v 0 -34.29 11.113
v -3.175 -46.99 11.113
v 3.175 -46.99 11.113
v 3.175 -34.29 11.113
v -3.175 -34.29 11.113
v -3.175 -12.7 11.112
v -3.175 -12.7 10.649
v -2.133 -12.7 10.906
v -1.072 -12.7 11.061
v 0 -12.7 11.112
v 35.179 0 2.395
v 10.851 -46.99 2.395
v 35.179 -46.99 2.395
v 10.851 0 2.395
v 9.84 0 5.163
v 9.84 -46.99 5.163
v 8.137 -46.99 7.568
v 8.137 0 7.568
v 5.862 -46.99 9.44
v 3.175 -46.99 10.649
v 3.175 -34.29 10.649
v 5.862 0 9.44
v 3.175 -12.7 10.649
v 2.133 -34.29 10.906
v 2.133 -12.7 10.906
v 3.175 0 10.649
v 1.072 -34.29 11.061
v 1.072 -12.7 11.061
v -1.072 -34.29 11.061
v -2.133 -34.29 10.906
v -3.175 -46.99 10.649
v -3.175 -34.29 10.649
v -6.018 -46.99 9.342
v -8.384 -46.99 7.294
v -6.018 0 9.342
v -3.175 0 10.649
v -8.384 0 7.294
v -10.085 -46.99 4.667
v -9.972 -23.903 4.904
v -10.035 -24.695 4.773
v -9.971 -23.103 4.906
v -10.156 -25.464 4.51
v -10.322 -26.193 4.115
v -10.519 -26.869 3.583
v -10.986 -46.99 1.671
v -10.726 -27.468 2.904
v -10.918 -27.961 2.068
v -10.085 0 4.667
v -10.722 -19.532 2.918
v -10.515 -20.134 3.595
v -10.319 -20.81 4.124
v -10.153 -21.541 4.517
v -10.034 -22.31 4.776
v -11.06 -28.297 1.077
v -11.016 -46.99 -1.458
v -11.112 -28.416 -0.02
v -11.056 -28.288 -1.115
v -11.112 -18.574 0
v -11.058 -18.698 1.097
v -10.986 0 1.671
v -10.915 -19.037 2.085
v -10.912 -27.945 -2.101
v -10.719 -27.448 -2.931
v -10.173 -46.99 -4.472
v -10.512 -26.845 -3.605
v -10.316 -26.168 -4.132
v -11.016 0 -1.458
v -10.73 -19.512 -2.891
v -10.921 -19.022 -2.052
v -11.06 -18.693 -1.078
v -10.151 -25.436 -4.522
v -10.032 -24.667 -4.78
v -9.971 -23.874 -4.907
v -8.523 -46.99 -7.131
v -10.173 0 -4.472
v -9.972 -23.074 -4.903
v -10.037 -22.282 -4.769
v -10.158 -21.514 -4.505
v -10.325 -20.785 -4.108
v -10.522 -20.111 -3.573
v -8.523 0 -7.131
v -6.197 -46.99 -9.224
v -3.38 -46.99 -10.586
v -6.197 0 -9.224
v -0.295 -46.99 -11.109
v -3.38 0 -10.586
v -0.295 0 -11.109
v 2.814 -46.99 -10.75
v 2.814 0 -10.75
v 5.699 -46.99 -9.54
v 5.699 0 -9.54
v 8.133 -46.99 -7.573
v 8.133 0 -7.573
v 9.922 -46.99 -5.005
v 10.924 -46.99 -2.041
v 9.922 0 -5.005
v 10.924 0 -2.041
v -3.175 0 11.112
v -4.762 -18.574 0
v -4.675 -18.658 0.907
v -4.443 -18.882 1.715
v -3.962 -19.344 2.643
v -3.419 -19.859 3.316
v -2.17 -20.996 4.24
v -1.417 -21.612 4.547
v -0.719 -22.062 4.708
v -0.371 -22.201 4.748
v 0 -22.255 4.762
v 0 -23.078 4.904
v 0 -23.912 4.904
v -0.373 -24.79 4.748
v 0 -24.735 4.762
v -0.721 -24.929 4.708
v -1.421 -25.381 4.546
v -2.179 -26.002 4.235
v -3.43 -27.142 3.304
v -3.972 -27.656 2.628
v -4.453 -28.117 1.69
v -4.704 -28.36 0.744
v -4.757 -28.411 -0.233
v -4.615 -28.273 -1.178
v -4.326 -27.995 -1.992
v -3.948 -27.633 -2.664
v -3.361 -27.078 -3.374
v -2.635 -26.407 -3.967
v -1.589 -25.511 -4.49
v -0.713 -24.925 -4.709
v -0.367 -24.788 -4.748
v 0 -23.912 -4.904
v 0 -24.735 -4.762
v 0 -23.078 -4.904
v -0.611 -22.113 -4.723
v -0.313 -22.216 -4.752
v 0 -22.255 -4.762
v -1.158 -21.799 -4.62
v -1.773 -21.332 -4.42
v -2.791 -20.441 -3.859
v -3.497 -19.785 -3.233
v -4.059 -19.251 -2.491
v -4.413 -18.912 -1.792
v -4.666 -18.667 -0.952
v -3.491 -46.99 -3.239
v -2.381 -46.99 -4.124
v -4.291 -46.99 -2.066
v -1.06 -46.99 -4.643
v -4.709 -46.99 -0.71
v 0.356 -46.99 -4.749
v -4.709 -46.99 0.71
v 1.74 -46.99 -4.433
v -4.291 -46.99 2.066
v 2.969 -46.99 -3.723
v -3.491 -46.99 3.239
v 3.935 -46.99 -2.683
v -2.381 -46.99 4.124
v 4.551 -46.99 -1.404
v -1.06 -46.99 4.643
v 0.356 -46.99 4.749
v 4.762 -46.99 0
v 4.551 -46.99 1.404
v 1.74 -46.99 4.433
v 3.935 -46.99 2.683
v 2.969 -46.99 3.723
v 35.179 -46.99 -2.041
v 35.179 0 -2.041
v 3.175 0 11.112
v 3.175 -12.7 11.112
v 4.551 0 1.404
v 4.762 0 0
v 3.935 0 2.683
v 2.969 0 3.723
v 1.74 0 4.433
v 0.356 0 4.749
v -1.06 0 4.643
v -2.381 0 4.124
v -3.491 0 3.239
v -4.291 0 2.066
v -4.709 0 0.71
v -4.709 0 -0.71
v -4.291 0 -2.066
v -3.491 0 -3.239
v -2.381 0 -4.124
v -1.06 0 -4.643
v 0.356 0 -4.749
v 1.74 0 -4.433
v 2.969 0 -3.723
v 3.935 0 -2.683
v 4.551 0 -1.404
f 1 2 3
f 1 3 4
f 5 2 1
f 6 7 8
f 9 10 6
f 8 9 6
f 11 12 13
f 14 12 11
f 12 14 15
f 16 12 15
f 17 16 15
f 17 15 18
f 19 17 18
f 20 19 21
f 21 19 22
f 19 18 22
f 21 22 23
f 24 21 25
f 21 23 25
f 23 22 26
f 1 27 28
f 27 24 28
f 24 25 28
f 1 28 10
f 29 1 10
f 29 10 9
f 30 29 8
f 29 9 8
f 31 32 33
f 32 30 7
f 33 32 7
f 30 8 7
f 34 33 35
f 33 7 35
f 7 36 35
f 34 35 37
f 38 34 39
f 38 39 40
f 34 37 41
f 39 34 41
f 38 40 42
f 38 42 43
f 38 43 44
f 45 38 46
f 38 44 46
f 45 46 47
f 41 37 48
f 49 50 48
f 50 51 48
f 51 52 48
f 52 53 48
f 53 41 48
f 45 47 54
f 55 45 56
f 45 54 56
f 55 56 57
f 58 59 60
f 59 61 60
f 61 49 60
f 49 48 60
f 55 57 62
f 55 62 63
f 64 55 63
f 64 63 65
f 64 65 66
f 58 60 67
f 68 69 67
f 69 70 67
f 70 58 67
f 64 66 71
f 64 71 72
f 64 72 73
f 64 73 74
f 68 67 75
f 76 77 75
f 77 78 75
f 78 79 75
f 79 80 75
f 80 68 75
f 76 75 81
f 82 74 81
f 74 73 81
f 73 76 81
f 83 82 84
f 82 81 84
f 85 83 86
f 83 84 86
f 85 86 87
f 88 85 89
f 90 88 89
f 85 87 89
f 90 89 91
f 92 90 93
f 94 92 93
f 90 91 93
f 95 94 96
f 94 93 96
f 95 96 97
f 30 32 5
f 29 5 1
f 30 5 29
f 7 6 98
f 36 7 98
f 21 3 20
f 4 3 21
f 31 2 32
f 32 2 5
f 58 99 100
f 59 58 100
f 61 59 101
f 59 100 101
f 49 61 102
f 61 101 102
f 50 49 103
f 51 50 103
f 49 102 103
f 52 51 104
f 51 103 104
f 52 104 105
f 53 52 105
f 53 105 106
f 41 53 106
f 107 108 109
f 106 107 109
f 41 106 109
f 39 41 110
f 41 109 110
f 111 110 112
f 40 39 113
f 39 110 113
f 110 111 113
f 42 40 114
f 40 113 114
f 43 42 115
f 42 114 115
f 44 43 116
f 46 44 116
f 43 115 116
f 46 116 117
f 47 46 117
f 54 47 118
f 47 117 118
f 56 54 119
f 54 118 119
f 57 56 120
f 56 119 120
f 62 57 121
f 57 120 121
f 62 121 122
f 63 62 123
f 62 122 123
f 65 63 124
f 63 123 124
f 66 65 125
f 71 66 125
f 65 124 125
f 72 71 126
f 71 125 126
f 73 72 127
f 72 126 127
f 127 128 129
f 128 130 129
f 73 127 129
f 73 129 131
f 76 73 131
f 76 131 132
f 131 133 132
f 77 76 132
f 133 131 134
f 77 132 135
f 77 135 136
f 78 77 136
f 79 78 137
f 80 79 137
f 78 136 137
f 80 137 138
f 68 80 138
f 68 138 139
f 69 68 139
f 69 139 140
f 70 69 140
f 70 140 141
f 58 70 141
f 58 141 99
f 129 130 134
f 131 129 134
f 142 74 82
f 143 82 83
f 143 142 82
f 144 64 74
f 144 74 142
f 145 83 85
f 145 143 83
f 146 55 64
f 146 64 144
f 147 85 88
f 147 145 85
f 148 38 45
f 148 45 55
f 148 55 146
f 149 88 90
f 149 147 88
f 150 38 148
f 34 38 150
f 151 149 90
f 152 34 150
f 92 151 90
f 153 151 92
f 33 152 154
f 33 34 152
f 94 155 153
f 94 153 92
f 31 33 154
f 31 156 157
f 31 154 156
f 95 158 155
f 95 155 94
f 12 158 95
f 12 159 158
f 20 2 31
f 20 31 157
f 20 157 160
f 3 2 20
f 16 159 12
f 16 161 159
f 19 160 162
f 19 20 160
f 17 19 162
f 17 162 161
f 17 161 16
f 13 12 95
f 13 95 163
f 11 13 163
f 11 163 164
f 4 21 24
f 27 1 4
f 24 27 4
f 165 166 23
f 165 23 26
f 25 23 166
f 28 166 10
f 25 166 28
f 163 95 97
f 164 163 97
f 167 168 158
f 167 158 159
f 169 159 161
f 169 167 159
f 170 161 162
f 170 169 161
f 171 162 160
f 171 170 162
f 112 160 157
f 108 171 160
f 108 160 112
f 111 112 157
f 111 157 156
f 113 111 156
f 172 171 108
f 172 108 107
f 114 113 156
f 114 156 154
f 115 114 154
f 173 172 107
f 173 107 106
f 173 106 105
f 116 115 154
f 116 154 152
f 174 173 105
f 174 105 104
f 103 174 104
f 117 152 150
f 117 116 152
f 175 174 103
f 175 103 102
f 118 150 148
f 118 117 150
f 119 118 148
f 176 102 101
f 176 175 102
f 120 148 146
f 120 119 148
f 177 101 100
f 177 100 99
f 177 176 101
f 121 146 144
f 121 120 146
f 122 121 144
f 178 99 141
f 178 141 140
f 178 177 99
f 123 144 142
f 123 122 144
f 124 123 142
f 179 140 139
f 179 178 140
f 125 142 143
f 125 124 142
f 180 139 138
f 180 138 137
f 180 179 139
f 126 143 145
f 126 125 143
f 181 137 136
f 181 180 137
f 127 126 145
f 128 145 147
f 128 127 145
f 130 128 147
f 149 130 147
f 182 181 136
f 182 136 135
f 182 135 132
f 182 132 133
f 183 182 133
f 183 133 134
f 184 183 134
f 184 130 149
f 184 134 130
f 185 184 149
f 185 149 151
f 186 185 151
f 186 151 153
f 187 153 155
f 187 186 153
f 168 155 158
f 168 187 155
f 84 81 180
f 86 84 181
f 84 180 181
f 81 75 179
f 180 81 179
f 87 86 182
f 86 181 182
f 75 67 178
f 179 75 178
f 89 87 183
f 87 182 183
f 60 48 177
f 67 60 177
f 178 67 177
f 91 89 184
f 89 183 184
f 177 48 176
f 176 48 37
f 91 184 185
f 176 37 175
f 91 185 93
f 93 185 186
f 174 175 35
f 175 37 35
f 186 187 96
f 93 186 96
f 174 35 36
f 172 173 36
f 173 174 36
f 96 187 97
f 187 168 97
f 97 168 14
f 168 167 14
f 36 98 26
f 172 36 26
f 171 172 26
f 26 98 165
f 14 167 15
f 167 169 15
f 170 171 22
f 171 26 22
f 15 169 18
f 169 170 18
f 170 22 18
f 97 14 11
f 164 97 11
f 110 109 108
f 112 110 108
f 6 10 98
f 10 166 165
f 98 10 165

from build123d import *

# Parameters (mm, degrees)
F0_R     = 11.1125
F0_R_2   = 4.7625
F1_DEPTH = 46.99
F2_W     = 12.7
F2_H     = 3.7792036489
F2_H_2   = 3.4237923279
F3_DEPTH = 3.175
F5_W     = 46.99
F5_H     = 4.4356931467
F6_DEPTH = 25.4
F7_R     = 4.92125
F8_DEPTH = 25.4


# Not quite as in the source:
# - a feature names something its author has since deleted; it is built from what else it names


with BuildPart() as f1:
    # F0 (on Front) → F1 (new body)
    with BuildSketch(Plane.XZ):
        Circle(F0_R)
        Circle(F0_R_2, mode=Mode.SUBTRACT)
    extrude(amount=F1_DEPTH)

    # F2 (on Right) → F3 (join, symmetric)
    with BuildSketch(Plane.YZ):
        with Locations((-40.64, 9.2228981756)):
            Rectangle(F2_W, F2_H)
        with Locations((-6.35, 9.400603836)):
            Rectangle(F2_W, F2_H_2)
    extrude(amount=F3_DEPTH, both=True)

    # F5 (on offset) → F6 (join)
    with BuildSketch(Plane.YZ.offset(9.779)):
        with Locations((-23.495, 0.1773260301)):
            Rectangle(F5_W, F5_H)
    extrude(amount=F6_DEPTH)

    # F7 (on Right) → F8 (cut)
    with BuildSketch(Plane.YZ):
        with Locations((-23.495, 0)):
            Circle(F7_R)
    extrude(amount=-F8_DEPTH, mode=Mode.SUBTRACT)


solid = f1.part
